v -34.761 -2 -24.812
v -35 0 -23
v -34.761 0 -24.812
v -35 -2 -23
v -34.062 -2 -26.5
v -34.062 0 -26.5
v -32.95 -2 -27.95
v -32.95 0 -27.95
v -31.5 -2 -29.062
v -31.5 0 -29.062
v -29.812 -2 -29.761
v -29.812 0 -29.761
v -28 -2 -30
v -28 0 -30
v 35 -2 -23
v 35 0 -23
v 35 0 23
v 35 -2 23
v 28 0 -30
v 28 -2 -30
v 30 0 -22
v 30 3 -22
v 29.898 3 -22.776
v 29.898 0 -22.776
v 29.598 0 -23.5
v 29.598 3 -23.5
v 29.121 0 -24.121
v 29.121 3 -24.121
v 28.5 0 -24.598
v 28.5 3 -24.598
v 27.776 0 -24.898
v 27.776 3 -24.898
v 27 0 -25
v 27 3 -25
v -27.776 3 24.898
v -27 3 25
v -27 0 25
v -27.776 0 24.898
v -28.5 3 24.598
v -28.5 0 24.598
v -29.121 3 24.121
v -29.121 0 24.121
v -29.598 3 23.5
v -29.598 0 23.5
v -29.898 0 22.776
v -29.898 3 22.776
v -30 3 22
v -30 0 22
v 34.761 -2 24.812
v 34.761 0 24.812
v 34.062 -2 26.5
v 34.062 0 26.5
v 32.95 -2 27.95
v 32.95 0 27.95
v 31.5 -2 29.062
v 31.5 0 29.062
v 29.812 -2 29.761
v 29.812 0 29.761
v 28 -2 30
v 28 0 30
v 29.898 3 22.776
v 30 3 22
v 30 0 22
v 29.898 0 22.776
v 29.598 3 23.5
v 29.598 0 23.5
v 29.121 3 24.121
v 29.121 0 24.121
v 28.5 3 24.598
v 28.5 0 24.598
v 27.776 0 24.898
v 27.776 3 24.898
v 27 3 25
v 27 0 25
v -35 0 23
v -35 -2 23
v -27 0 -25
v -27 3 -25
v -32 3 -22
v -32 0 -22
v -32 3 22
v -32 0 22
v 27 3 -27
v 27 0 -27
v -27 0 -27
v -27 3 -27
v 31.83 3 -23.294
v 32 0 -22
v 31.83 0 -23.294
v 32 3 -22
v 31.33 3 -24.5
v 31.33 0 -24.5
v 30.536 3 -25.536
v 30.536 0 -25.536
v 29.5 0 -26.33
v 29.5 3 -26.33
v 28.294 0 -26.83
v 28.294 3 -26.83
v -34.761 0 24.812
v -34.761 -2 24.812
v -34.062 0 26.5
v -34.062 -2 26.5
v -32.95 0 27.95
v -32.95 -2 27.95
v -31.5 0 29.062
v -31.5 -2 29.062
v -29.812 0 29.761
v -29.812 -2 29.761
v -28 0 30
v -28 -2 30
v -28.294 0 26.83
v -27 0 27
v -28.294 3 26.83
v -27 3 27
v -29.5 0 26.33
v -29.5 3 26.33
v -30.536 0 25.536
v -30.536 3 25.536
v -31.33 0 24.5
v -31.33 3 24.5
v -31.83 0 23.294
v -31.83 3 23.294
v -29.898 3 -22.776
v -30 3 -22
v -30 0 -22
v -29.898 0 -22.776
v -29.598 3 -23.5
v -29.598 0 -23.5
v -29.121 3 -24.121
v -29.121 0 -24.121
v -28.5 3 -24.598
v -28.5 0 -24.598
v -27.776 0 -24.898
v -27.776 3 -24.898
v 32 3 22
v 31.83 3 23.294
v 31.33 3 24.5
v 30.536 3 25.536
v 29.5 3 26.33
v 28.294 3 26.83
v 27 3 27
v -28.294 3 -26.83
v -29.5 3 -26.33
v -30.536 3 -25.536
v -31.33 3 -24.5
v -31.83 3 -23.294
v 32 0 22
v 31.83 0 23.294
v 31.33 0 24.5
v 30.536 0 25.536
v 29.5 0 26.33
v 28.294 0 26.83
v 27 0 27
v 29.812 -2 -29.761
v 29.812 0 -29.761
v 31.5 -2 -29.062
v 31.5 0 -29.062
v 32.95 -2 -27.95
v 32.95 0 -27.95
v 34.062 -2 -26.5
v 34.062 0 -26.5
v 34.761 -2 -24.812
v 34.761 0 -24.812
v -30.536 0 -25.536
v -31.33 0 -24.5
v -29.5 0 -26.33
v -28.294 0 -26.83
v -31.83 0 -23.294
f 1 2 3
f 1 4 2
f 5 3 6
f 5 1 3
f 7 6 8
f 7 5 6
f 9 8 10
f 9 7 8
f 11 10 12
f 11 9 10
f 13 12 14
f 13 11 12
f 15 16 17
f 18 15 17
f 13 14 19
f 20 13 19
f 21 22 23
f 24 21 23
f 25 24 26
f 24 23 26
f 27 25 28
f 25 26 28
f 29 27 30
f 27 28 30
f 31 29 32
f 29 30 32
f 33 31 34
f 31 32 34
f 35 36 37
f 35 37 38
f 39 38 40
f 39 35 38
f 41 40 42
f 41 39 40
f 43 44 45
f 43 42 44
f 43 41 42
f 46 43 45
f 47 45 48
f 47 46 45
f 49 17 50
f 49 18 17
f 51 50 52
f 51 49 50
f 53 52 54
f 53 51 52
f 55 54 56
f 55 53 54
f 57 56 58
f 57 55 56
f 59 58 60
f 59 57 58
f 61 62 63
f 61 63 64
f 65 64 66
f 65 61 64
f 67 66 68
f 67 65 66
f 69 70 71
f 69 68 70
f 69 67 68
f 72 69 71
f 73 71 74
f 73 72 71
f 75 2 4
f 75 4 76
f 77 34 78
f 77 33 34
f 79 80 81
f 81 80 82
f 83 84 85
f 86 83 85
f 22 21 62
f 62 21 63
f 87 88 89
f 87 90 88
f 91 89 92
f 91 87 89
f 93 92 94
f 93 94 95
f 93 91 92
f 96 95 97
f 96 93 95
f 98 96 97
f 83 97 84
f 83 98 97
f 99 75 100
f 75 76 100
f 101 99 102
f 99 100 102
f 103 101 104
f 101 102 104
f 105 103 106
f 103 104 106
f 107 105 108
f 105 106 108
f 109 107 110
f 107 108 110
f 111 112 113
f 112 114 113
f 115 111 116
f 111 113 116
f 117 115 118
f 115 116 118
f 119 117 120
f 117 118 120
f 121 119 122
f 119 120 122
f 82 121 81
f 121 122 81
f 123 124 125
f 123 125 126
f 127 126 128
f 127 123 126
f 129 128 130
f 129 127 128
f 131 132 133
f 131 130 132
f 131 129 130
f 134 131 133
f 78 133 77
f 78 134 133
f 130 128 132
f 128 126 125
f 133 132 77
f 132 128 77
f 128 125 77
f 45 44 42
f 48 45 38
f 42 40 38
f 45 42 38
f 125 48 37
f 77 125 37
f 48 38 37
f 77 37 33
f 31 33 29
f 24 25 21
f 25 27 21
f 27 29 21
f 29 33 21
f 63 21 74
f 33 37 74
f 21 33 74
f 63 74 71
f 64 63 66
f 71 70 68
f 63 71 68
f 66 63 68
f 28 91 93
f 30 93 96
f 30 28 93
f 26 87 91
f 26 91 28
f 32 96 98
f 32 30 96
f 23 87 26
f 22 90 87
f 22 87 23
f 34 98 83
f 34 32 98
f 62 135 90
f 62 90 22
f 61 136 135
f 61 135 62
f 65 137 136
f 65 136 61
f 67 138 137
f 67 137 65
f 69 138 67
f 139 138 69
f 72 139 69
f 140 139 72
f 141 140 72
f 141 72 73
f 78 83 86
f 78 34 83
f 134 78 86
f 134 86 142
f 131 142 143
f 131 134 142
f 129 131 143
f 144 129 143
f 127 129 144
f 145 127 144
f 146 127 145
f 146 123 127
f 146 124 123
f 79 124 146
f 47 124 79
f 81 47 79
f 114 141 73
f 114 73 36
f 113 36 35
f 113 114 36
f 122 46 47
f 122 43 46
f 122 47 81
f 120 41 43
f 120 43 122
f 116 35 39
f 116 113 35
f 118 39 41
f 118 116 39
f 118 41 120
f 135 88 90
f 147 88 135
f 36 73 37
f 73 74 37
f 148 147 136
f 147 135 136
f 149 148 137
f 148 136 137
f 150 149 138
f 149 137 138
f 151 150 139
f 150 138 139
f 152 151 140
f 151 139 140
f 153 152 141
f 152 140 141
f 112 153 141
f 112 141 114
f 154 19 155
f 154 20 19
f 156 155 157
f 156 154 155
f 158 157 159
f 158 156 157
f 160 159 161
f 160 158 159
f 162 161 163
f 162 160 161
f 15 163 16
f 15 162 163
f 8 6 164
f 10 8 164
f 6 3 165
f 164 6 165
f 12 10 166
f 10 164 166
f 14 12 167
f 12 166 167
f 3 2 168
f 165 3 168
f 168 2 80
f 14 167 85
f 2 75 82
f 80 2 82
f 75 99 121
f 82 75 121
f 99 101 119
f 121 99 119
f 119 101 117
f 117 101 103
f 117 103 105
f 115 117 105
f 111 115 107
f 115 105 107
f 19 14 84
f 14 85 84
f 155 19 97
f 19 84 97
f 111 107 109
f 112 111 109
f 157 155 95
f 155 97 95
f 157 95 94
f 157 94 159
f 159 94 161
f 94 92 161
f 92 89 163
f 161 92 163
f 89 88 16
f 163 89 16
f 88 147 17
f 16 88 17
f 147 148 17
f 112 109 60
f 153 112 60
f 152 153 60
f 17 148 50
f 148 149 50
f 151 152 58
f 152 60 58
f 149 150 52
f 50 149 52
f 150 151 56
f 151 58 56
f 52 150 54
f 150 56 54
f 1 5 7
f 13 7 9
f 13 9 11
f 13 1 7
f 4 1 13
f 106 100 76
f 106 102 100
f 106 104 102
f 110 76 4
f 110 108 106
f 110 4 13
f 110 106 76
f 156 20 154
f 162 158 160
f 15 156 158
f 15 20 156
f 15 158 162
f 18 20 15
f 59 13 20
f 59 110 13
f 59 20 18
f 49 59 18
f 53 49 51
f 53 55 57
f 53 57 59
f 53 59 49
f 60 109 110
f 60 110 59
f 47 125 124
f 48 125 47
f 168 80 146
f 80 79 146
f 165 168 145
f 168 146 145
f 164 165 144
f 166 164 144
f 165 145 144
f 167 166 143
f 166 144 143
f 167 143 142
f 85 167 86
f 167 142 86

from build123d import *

# Parameters (mm, degrees)
F0_W     = 70
F0_H     = 60
F1_DEPTH = 2
F2_R     = 7
F3_W     = 64
F3_H     = 54
F4_DEPTH = 3
F5_R     = 5
F6_T     = -2


with BuildPart() as f1:
    # F0 (on Front) → F1 (new body)
    with BuildSketch(Plane.XZ):
        Rectangle(F0_W, F0_H)
    extrude(amount=F1_DEPTH)

    # F2
    f2_edges = [f1.edges().sort_by_distance(p)[0] for p in [
        (-35, -1, 30),
        (35, -1, 30),
        (35, -1, -30),
        (-35, -1, -30),
    ]]
    fillet(f2_edges, radius=F2_R)

    # F3 (on face) → F4 (join)
    with BuildSketch(Plane(origin=(0, 0, 0), x_dir=(-1, 0, 0), z_dir=(0, 1, 0))):
        Rectangle(F3_W, F3_H)
    extrude(amount=F4_DEPTH)

    # F5
    f5_edges = [f1.edges().sort_by_distance(p)[0] for p in [
        (32, 1.5, 27),
        (-32, 1.5, 27),
        (32, 1.5, -27),
        (-32, 1.5, -27),
    ]]
    fillet(f5_edges, radius=F5_R)

    # F6
    f6_openings = [f1.faces().sort_by_distance(p)[0] for p in [
        (0, 3, 0),
    ]]
    offset(amount=F6_T, openings=f6_openings, kind=Kind.INTERSECTION)


solid = f1.part
